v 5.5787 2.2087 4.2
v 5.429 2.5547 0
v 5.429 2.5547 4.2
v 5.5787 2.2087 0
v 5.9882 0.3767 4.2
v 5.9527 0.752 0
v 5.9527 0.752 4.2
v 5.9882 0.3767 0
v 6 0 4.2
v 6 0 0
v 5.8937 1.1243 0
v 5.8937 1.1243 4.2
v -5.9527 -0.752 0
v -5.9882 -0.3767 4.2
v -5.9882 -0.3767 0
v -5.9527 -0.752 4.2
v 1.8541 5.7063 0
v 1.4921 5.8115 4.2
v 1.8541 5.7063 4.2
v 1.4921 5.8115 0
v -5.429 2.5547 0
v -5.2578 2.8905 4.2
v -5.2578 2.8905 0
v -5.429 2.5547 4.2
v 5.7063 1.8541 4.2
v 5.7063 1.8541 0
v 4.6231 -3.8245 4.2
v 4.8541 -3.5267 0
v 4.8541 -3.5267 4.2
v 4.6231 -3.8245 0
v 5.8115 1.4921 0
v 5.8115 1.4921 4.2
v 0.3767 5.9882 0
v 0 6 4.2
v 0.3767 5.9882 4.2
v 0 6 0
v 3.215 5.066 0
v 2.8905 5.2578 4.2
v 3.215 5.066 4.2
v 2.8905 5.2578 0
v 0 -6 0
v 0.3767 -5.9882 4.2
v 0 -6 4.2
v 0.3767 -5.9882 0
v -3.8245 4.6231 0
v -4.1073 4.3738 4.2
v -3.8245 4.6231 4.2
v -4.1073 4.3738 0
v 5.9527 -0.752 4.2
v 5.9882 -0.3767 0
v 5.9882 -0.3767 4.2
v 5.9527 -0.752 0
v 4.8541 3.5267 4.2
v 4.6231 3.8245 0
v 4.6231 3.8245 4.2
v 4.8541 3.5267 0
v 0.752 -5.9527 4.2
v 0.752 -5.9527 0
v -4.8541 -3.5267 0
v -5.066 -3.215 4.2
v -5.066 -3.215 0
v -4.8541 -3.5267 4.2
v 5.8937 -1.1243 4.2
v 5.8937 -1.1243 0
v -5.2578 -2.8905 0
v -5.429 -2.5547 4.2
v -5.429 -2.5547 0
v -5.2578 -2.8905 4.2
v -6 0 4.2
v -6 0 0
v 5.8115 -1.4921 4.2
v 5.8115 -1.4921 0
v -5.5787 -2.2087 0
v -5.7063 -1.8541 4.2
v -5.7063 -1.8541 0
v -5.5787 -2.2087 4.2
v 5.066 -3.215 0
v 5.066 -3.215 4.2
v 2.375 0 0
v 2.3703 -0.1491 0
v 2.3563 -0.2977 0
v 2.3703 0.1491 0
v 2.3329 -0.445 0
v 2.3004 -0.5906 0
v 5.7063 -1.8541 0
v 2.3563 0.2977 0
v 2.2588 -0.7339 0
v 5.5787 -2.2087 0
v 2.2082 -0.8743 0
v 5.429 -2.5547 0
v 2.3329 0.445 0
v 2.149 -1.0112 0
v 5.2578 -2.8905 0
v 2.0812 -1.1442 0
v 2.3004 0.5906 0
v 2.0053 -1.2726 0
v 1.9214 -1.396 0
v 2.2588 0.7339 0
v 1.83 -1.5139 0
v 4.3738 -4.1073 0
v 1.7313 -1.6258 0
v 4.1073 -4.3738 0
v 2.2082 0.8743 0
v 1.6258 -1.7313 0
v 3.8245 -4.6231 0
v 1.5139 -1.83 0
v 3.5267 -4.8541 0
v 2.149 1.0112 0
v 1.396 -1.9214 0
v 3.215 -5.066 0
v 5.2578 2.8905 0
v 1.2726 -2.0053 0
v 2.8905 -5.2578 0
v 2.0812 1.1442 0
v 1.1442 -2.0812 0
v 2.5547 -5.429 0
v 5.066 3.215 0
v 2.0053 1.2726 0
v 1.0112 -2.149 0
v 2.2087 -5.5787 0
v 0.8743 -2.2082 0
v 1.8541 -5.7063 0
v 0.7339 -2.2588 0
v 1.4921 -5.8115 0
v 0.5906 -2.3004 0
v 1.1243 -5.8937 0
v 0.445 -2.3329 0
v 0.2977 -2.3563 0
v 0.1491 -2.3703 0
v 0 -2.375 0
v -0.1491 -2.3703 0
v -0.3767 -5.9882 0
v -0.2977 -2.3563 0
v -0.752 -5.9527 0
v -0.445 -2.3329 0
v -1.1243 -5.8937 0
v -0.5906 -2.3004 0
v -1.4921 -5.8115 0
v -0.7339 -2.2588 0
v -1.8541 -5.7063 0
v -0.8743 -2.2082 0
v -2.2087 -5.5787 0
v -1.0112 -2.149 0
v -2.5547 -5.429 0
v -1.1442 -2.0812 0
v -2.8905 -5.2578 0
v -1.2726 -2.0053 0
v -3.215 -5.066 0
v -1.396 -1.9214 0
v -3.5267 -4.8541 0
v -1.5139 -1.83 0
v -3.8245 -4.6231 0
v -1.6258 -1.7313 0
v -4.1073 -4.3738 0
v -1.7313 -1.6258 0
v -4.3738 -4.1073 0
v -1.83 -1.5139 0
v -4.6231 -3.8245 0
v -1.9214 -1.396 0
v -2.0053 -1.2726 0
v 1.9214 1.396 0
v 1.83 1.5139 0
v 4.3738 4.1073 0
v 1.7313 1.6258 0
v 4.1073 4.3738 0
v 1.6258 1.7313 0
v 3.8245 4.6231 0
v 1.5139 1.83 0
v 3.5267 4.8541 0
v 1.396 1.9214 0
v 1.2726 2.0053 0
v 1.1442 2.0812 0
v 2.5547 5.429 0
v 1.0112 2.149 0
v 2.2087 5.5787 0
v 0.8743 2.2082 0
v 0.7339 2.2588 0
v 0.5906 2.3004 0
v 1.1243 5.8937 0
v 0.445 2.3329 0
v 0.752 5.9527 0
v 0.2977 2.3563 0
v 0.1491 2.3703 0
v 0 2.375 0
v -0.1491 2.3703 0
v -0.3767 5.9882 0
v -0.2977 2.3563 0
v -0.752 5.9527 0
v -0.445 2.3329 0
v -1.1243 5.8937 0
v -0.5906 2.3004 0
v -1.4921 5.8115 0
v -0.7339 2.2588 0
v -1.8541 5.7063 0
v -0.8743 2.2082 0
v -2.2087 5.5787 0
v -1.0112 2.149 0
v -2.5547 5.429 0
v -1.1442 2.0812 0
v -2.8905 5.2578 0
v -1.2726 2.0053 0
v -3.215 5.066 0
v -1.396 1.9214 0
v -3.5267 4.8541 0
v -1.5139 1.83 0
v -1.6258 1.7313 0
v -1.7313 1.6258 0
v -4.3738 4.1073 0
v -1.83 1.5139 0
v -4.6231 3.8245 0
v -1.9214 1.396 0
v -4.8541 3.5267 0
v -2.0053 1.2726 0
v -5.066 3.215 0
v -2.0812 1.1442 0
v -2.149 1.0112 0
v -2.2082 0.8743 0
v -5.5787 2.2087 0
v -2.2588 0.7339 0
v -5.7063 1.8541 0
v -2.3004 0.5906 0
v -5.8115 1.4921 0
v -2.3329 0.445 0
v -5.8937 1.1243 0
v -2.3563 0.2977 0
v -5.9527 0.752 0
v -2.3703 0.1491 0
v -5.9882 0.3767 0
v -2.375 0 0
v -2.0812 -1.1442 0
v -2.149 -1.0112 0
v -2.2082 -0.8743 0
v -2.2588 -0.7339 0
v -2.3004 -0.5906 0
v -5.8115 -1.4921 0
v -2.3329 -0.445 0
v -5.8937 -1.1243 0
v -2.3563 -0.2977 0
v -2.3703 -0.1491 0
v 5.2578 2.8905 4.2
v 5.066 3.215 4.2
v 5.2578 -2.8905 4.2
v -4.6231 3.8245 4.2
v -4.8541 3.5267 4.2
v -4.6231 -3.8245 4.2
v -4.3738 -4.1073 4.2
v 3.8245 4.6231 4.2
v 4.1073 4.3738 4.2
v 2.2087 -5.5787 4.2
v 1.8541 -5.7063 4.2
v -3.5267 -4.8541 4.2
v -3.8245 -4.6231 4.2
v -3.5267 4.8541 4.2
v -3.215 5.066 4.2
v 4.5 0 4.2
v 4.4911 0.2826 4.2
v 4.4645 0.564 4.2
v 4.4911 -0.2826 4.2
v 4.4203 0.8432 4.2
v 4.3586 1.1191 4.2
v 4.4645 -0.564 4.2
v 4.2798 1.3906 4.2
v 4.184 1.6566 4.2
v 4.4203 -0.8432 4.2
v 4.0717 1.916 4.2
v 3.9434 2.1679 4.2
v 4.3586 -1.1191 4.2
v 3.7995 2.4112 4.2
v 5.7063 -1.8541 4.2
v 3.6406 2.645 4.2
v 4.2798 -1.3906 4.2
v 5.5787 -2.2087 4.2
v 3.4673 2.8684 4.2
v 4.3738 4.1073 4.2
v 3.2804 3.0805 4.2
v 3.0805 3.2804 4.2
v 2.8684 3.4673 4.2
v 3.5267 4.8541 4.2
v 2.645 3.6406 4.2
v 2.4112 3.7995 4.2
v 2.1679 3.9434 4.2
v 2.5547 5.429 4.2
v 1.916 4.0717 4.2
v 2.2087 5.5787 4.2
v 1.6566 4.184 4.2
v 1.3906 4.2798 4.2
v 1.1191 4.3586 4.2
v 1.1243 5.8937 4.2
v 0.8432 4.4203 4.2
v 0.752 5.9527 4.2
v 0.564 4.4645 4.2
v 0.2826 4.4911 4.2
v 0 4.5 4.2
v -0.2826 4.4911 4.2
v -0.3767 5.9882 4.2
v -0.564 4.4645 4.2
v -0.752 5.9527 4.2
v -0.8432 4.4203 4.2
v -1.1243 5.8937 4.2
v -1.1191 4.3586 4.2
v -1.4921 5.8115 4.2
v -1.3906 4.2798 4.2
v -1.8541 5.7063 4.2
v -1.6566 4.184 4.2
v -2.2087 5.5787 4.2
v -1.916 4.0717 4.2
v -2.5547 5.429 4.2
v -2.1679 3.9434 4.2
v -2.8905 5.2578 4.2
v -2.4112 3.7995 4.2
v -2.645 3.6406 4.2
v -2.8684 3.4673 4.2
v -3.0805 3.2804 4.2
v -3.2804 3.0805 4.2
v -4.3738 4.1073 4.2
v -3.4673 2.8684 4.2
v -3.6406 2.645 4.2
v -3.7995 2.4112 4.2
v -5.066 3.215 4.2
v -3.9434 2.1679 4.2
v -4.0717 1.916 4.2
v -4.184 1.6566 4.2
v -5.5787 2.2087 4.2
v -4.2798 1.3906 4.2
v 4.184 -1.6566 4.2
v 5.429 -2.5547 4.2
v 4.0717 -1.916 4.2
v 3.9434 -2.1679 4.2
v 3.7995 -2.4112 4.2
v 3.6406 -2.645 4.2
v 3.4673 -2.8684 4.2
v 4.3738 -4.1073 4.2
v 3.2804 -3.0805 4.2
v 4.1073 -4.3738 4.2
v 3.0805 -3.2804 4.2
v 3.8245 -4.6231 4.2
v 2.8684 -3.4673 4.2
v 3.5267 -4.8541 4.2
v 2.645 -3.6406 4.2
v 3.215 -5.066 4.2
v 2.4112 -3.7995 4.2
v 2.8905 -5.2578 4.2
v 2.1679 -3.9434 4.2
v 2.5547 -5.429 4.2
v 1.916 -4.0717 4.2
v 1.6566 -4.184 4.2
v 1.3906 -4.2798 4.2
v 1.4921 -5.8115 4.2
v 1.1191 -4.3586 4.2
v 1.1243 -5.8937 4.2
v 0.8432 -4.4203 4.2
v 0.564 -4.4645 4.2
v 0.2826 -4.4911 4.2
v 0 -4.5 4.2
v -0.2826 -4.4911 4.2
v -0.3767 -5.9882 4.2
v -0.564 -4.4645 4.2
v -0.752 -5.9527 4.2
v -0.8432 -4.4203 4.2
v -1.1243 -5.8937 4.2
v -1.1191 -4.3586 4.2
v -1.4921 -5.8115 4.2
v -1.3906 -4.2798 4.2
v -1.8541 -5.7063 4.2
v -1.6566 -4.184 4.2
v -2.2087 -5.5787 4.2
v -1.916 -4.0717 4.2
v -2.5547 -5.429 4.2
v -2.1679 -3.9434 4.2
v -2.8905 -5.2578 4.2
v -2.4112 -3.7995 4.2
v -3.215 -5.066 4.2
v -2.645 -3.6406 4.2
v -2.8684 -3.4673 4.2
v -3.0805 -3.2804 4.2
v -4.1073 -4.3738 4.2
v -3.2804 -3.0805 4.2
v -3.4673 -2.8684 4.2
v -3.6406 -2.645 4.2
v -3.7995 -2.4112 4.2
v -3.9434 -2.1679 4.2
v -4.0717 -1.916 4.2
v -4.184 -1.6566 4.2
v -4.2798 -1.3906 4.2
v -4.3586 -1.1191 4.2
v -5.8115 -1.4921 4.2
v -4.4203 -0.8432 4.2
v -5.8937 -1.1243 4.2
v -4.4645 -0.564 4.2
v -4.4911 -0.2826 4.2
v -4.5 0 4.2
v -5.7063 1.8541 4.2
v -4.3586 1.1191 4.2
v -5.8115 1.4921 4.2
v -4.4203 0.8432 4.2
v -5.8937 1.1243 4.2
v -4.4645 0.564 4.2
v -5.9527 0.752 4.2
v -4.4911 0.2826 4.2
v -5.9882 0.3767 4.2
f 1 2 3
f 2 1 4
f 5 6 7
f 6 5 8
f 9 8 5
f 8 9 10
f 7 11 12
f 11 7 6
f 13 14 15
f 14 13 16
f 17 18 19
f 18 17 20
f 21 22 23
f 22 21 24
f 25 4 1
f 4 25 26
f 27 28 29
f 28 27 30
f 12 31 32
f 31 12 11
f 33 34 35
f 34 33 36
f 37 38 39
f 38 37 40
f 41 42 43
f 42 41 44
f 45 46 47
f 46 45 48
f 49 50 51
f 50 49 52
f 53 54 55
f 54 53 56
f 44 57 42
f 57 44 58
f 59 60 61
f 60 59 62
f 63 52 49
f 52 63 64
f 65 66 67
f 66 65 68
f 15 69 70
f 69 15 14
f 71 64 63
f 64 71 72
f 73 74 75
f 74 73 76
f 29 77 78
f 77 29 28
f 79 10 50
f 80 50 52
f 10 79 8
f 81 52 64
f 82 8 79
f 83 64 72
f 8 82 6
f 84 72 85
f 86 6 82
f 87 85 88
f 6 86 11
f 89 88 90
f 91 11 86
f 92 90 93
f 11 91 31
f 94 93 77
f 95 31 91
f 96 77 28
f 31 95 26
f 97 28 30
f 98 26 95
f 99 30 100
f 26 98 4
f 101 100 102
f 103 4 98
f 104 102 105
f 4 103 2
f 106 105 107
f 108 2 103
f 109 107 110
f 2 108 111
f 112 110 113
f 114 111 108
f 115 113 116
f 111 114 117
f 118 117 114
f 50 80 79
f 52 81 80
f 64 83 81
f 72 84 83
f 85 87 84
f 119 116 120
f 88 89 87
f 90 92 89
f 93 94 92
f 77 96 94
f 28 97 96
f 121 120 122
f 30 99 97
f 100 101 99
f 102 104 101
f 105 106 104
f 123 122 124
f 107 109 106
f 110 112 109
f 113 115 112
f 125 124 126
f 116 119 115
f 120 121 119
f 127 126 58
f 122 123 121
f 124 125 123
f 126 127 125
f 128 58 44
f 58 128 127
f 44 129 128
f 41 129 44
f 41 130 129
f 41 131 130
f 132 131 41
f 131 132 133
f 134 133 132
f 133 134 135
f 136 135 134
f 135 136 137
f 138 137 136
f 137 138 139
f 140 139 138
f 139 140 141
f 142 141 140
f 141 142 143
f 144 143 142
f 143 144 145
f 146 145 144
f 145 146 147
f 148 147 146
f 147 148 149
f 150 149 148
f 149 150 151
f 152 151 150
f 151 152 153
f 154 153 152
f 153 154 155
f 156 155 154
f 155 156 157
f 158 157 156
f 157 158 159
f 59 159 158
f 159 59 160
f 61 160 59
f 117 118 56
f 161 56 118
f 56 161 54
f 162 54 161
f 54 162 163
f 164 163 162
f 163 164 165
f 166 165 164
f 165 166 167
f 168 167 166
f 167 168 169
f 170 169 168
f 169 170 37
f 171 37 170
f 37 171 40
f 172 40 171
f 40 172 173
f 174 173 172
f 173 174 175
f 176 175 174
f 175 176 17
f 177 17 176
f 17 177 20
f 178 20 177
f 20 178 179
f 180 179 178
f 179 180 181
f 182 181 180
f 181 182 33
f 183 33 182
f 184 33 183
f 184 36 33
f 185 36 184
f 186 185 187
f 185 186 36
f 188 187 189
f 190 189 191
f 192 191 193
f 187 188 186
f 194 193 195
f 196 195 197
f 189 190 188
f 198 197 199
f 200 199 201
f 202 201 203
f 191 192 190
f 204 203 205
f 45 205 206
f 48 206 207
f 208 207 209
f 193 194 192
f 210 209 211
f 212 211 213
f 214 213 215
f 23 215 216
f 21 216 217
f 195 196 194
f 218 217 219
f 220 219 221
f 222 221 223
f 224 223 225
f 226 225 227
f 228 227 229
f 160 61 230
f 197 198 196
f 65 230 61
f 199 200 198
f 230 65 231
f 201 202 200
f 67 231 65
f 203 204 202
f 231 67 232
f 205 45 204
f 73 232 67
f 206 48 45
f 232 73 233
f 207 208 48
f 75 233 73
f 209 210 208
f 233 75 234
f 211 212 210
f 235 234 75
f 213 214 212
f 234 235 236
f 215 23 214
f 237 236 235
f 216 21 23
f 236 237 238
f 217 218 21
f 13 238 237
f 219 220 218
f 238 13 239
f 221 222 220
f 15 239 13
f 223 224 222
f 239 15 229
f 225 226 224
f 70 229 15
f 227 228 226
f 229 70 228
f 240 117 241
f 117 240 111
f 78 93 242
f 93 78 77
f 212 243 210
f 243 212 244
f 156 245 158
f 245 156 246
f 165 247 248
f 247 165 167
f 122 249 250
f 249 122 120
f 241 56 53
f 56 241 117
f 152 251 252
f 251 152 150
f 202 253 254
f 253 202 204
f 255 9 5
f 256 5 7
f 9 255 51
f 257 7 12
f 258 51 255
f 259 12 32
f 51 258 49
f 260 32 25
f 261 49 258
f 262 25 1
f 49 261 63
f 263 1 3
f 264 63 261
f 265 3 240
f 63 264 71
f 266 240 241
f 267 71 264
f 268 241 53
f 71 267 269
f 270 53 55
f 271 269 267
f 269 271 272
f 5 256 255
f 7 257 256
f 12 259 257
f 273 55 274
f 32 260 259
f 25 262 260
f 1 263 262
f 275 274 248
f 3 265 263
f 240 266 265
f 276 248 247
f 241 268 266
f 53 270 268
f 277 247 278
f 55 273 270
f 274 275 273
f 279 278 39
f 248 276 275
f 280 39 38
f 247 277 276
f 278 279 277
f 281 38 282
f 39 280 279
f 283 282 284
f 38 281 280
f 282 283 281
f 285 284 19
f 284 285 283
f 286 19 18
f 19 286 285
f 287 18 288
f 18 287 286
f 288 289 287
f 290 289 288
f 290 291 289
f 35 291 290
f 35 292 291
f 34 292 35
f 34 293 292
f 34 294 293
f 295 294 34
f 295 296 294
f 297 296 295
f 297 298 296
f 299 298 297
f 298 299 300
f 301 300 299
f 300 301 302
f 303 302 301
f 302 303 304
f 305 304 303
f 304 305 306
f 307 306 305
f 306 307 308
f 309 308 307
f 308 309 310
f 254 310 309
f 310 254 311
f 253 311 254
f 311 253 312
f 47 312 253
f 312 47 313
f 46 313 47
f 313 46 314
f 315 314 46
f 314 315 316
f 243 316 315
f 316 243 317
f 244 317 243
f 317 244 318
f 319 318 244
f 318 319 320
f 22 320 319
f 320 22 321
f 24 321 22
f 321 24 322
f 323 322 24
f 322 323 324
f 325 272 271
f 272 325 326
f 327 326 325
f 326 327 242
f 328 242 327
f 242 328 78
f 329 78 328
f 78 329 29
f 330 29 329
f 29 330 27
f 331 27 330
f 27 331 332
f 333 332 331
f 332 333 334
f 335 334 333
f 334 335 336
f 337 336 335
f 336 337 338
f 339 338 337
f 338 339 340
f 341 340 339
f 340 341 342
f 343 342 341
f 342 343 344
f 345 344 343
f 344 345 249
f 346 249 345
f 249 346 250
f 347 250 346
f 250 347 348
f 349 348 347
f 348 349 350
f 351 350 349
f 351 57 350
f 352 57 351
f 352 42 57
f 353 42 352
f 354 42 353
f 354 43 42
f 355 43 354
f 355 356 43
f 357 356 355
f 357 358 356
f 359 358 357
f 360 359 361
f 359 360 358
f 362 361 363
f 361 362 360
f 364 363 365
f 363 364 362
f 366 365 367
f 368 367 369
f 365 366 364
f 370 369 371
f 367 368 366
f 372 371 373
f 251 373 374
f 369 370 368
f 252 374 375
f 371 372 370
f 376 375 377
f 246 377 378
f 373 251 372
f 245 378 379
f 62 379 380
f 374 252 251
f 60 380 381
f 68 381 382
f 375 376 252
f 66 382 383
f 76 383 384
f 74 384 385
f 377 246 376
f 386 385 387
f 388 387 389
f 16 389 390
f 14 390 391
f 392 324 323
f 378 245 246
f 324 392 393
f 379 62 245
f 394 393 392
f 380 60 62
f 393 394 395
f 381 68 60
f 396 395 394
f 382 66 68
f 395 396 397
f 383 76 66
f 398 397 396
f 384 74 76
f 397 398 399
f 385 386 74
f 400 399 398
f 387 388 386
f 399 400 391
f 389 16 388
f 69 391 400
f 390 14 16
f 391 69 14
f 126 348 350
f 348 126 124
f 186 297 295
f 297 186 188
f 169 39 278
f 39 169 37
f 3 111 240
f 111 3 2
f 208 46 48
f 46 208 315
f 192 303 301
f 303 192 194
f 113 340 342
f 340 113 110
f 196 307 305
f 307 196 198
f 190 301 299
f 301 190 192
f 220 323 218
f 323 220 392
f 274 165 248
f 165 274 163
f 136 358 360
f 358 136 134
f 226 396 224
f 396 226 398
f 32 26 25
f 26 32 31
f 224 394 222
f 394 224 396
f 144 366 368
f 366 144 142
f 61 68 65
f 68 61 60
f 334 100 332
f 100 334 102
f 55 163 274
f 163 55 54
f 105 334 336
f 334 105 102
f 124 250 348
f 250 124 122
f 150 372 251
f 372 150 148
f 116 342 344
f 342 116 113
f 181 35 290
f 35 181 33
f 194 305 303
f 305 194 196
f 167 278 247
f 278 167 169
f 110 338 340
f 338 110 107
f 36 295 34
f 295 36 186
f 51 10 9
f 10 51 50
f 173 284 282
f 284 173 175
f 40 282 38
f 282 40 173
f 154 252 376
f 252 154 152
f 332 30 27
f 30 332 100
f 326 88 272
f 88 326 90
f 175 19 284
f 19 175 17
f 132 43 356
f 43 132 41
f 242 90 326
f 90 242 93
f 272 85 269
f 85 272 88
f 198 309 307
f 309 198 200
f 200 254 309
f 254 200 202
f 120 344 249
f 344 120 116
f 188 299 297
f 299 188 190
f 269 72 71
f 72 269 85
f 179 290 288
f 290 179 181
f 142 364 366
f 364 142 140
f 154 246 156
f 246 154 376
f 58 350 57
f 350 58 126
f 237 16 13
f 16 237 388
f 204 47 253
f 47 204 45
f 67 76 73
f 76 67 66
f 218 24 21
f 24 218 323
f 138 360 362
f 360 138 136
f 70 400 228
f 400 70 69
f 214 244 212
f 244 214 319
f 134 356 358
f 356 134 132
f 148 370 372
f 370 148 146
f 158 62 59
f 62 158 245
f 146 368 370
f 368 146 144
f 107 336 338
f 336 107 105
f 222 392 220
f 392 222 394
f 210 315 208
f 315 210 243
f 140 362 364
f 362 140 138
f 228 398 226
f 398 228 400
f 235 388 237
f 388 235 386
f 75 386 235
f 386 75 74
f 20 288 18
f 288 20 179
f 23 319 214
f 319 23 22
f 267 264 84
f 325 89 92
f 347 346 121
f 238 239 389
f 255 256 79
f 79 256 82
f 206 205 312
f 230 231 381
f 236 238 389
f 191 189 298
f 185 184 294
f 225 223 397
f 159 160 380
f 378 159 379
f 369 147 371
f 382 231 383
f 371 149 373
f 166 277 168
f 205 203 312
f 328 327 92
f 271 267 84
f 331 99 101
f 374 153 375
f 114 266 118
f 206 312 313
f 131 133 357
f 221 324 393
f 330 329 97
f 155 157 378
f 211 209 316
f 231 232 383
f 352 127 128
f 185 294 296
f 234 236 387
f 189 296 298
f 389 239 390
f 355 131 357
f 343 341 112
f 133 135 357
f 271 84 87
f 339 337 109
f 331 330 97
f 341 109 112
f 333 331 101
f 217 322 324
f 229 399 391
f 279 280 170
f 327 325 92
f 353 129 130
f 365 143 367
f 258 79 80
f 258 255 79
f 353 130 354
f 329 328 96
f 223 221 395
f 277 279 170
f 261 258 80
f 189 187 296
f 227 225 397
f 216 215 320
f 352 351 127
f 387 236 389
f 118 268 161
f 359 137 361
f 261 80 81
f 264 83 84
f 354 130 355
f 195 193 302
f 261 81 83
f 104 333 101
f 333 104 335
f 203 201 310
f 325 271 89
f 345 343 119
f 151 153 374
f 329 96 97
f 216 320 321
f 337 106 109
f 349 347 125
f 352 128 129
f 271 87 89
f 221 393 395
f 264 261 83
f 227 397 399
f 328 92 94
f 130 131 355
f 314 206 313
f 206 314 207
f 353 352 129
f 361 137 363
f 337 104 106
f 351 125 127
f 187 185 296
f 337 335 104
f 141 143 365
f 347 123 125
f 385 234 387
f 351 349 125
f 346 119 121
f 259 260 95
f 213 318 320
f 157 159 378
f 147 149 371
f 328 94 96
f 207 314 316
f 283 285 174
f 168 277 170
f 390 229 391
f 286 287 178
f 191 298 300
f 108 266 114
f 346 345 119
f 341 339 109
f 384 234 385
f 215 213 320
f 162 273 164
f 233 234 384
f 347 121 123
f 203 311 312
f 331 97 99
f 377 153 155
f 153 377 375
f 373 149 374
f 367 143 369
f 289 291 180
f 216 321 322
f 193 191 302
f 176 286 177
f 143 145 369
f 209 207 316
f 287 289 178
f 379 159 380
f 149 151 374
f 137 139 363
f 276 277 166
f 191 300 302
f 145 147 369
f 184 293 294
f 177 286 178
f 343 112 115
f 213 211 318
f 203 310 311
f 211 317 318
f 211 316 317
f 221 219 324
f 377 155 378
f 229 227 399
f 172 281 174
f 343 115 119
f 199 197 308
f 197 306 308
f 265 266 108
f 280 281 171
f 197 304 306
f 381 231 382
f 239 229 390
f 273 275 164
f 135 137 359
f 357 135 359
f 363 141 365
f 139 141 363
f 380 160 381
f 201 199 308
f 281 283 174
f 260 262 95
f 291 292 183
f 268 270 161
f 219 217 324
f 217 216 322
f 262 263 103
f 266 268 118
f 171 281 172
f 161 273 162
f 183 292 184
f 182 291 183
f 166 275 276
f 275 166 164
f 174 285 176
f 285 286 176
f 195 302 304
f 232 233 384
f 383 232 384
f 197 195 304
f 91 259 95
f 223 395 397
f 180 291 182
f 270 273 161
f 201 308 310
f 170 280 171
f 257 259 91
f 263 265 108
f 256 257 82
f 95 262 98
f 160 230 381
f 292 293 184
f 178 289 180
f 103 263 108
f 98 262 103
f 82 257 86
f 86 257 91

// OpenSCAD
$fn = 100;

difference() {
    cylinder(h=4.2, d=12);
    translate([0, 0, 0])
        cylinder(h=4.2, r1=2.375, r2=4.5);
    translate([0, 0, -1])
        cylinder(h=6.2, r=2.375);
}
